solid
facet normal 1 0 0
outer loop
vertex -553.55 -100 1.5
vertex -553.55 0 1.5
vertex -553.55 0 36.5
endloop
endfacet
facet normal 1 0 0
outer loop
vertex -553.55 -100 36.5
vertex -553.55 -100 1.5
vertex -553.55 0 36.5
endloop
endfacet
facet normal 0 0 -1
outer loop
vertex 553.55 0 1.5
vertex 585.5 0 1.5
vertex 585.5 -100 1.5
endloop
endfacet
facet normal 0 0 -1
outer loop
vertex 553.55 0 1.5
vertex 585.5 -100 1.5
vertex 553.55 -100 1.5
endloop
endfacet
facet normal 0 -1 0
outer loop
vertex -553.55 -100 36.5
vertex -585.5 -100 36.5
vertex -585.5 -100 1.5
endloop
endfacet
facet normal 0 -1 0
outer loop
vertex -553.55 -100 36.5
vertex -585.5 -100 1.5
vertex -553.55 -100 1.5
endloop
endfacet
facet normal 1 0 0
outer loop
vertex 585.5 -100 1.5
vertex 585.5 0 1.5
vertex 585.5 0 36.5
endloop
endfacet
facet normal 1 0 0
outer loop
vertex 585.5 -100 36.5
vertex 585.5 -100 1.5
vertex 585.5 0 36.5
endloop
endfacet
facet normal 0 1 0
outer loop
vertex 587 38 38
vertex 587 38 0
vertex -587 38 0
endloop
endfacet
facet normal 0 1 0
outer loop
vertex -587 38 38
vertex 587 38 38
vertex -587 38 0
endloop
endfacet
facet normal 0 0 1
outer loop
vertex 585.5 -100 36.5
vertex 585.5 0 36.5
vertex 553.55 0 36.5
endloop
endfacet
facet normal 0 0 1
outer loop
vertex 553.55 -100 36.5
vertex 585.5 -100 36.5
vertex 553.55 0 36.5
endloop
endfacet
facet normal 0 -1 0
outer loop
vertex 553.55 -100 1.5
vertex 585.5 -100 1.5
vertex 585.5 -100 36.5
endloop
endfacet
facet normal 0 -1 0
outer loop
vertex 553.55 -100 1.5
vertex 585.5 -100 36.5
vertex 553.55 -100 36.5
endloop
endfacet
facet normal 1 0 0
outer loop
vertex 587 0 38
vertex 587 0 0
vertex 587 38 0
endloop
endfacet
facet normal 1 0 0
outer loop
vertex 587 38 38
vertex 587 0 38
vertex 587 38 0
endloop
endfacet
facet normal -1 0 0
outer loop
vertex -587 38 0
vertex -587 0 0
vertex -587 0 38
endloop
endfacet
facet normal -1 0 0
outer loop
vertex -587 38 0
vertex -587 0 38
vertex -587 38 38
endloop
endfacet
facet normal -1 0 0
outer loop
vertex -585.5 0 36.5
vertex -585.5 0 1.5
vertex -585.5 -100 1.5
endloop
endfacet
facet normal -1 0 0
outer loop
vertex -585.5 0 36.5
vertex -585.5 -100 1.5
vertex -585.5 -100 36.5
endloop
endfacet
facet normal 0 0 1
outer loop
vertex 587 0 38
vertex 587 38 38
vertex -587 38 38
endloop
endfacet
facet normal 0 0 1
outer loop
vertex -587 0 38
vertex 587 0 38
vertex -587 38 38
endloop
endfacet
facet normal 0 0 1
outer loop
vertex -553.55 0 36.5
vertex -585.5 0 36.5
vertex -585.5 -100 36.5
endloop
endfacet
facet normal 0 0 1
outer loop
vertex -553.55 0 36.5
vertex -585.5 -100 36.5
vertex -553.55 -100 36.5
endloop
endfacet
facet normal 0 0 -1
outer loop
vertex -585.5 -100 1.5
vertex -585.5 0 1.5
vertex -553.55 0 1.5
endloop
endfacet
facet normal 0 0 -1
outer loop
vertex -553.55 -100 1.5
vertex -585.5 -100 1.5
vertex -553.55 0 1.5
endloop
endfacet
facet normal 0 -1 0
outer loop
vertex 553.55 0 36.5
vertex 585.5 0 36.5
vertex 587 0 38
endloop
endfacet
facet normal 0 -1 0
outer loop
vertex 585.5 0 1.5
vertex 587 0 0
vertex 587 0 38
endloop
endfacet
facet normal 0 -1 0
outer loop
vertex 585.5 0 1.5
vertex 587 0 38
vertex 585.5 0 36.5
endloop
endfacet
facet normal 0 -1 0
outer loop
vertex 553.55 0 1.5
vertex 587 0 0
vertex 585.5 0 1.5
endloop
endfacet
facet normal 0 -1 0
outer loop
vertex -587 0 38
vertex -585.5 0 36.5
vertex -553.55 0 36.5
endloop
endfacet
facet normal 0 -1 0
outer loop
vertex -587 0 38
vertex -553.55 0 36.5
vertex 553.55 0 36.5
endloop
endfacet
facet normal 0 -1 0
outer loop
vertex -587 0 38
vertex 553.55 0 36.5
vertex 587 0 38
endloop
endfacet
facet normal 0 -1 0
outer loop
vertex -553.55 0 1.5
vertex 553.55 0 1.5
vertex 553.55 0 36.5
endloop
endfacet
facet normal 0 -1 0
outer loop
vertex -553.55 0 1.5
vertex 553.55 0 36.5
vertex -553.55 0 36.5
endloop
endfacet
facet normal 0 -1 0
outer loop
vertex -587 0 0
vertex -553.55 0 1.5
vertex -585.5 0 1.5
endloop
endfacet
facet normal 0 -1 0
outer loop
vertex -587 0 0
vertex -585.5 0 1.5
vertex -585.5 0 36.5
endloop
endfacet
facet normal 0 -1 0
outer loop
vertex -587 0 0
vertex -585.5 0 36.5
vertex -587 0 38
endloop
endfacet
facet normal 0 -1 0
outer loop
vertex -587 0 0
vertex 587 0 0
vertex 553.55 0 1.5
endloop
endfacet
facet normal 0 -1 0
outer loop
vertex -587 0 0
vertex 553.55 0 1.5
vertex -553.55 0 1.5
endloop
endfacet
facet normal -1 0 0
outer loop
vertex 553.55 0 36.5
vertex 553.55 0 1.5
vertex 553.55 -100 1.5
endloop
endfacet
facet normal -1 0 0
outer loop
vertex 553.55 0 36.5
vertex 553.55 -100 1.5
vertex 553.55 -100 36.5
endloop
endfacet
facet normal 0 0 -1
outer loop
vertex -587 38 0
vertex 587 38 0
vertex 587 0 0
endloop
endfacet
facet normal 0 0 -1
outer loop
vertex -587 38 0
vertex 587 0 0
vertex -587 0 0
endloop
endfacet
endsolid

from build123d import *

# Parameters (mm, degrees)
SKETCH2_W           = 587
SKETCH2_H           = 38
EXTRUDE_THIN1_DEPTH = 38
SKETCH3_W           = 31.95
SKETCH3_H           = 35
BOSS_EXTRUDE1_DEPTH = 100


with BuildPart() as part:
    # Sketch2 → Extrude-Thin1 (new body)
    with BuildSketch(Plane.XY):
        with Locations((-293.5, 19)):
            Rectangle(SKETCH2_W, SKETCH2_H)
    extrude(amount=EXTRUDE_THIN1_DEPTH)

    # Sketch3 → Boss-Extrude1 (add)
    with BuildSketch(Plane.XZ):
        with Locations((-569.525, 19)):
            Rectangle(SKETCH3_W, SKETCH3_H)
    extrude(amount=BOSS_EXTRUDE1_DEPTH)

    # Mirror1: part across plane


with BuildPart() as part_1:
    add(part.part)
    add(part.part.mirror(Plane(origin=(0, 38, 38), x_dir=(0, 0, 1), z_dir=(1, 0, 0))))


solid = part_1.part
